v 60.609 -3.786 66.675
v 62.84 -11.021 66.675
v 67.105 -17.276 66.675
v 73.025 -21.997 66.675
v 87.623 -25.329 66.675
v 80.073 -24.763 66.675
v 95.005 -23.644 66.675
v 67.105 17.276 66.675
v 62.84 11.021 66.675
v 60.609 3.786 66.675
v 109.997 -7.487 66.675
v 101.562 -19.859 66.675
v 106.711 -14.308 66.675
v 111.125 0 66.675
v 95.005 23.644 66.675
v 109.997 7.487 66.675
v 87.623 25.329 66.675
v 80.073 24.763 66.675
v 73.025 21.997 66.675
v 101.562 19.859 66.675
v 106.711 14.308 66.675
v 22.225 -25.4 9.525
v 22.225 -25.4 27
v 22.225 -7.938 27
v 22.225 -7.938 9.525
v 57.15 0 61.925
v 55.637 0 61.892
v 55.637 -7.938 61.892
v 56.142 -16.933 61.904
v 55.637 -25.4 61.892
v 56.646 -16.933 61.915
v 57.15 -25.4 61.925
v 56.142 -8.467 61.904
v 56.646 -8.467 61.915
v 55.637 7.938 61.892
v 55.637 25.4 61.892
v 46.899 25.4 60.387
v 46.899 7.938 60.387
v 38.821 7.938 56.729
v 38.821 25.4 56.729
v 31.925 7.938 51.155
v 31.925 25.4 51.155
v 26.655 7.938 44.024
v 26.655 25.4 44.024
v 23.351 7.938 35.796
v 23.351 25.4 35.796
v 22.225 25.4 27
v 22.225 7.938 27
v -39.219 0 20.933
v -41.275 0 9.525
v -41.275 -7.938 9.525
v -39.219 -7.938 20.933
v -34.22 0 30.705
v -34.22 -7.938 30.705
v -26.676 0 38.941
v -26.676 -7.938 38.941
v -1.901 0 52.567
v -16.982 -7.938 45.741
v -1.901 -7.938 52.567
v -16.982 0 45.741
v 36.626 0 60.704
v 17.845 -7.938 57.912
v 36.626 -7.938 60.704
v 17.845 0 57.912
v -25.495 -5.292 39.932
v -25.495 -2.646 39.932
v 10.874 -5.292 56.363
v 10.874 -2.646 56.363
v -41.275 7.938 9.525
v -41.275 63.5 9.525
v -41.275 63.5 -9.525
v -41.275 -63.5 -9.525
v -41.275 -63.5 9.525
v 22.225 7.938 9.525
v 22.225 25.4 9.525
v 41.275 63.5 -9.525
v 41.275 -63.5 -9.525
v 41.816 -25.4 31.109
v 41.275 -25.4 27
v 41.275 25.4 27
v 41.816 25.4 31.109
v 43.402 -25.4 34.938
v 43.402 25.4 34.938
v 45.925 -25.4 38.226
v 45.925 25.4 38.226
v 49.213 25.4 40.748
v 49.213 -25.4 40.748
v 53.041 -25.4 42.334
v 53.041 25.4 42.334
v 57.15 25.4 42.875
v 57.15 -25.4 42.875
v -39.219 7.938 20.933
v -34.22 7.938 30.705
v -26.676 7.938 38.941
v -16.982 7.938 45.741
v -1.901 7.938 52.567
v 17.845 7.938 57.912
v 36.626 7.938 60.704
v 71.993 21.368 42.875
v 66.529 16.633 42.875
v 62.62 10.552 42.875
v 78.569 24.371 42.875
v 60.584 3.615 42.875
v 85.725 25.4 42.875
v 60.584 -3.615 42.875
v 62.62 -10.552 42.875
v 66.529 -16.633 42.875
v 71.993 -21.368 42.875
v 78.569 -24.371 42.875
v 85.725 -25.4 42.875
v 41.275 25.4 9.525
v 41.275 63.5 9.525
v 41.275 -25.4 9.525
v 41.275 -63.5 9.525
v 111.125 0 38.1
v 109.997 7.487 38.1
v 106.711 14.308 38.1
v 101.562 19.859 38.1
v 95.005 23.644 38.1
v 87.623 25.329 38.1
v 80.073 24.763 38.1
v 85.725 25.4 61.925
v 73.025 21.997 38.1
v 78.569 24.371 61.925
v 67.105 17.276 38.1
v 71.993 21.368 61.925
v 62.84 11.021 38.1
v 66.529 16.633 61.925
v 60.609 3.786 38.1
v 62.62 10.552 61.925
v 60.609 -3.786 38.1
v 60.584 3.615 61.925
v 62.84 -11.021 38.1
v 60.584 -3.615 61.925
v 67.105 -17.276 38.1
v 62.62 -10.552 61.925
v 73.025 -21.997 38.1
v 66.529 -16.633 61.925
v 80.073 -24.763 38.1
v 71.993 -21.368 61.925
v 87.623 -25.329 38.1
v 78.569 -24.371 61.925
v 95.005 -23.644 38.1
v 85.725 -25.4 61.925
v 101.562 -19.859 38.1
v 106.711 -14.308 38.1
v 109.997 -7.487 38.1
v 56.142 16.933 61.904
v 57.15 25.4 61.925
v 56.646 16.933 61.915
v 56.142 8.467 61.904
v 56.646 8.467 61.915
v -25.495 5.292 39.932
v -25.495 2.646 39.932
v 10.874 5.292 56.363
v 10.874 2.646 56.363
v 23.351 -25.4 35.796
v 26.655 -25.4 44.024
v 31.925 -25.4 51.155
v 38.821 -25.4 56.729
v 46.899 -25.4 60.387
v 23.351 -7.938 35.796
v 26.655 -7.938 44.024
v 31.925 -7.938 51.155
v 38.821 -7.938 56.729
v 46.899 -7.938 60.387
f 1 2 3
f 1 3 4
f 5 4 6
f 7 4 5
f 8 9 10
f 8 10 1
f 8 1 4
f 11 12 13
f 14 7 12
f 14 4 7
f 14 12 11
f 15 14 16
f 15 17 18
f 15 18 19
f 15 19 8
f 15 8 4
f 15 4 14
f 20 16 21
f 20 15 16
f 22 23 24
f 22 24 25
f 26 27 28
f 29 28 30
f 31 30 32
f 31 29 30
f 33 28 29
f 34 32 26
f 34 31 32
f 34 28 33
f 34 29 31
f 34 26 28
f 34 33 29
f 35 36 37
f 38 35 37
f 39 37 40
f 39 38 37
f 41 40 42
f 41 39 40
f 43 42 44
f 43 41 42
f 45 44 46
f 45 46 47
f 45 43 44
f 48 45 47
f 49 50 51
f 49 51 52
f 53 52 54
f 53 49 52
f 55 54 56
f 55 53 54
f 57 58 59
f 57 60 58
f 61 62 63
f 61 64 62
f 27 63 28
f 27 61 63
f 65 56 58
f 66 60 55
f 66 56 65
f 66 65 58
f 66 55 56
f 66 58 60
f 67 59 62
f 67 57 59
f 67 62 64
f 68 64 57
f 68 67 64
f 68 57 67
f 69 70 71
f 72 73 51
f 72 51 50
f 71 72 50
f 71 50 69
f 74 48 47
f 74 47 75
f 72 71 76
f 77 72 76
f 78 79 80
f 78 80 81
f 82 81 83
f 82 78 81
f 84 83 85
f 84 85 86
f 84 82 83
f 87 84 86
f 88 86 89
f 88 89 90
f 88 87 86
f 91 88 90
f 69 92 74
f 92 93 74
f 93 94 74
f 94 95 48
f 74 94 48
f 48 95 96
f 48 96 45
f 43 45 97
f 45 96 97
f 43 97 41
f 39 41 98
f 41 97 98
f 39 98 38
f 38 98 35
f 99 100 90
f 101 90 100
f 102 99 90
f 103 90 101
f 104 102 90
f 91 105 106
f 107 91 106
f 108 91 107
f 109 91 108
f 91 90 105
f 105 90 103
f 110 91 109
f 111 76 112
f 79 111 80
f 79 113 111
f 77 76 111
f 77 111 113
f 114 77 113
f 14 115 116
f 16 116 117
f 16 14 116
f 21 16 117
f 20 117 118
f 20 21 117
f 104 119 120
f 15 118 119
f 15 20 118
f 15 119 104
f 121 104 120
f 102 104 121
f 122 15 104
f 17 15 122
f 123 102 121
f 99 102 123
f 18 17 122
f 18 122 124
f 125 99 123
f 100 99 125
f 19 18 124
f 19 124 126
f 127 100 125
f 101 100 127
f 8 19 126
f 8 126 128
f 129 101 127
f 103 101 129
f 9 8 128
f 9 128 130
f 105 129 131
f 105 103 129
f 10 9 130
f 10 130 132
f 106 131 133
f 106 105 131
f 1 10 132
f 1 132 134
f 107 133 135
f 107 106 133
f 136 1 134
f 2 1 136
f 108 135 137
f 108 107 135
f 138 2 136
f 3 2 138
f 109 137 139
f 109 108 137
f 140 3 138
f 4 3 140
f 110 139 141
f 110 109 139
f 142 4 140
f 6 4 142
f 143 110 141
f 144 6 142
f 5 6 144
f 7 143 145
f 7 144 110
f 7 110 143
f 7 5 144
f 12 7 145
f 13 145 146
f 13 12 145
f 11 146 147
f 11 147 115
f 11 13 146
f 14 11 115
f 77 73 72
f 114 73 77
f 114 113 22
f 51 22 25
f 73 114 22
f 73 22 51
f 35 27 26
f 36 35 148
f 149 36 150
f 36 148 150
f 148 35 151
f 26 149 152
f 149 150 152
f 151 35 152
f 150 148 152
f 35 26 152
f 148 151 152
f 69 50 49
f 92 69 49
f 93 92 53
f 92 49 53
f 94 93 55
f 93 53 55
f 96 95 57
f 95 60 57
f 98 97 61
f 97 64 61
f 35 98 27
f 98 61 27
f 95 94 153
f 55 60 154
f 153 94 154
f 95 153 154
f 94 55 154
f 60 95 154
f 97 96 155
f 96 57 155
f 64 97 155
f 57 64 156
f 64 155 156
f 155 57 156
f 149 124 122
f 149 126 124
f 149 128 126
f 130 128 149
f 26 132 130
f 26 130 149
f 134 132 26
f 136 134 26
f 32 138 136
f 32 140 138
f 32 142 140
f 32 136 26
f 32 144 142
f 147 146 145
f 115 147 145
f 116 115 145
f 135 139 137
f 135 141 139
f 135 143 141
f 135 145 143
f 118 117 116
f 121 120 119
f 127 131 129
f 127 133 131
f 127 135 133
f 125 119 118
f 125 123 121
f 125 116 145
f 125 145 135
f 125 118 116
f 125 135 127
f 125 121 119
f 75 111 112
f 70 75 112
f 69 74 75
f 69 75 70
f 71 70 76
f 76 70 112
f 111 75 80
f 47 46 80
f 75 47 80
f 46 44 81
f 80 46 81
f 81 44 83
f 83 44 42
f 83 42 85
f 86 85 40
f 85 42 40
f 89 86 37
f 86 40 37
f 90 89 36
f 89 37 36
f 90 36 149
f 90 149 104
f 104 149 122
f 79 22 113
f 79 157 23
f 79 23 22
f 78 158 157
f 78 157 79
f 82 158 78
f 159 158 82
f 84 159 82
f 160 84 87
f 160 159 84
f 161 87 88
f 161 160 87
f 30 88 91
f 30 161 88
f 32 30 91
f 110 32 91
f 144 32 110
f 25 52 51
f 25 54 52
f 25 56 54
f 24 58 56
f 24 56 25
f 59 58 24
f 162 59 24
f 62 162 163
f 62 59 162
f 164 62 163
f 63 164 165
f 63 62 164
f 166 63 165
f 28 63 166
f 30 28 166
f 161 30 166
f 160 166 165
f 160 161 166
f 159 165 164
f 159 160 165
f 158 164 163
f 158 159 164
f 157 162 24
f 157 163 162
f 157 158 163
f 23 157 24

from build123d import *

# Parameters (mm, degrees)
F1_DEPTH = 63.5
F0_W     = 25.4
F0_H     = 19.05
F2_DEPTH = 25.4
F3_DEPTH = 7.9375


with BuildPart() as f1:
    # F0 (on Front) → F1 (new body, symmetric)
    with BuildSketch(Plane.XZ):
        Polygon((41.275, -9.525), (41.275, 9.525), (22.225, 9.525), (-41.275, 9.525), (-41.275, -9.525), align=None)
    extrude(amount=F1_DEPTH, both=True)

    # F0 (on Front) → F2 (join, symmetric)
    with BuildSketch(Plane.XZ):
        with BuildLine():
            Line((22.225, 9.525), (41.275, 9.525))
            Line((41.275, 9.525), (41.275, 27.0002))
            ThreePointArc((41.275, 27.0002), (45.9246798487, 38.2255201513), (57.15, 42.8752))
            Line((57.15, 42.8752), (60.325, 42.8752))
            Line((60.325, 42.8752), (60.325, 61.9252))
            Line((60.325, 61.9252), (57.15, 61.9252))
            add(Edge.make_bspline(
                [(55.6374674655, 61.8924322349), (56.1423918101, 61.9048336292), (56.6465953403, 61.9157496607), (57.15, 61.9252)],
                knots=[110.2644548884, 110.2644548884, 110.2644548884, 110.2644548884, 111.5045361635, 111.5045361635, 111.5045361635, 111.5045361635], degree=3))
            ThreePointArc((55.6374674655, 61.8924322349), (31.9252024412, 51.1552245936), (22.225, 27.0002))
            Line((22.225, 27.0002), (22.225, 9.525))
        make_face()
        with Locations((73.025, 52.4002)):
            Rectangle(F0_W, F0_H)
    extrude(amount=F2_DEPTH, both=True)

    # F0 (on Front) → F3 (join, symmetric)
    with BuildSketch(Plane.XZ):
        with BuildLine():
            Line((-41.275, 9.525), (22.225, 9.525))
            Line((22.225, 9.525), (22.225, 27.0002))
            ThreePointArc((22.225, 27.0002), (31.9252024412, 51.1552245936), (55.6374674655, 61.8924322349))
            add(Edge.make_bspline(
                [(-41.275, 9.525), (-39.8543103668, 47.9433842004), (10.7410491974, 60.789735975), (55.6374674655, 61.8924322349)],
                knots=[0, 0, 0, 0, 110.2644548884, 110.2644548884, 110.2644548884, 110.2644548884], degree=3))
        make_face()
    extrude(amount=F3_DEPTH, both=True)

    # F0 (on Front) → F4 (revolve)
    with BuildSketch(Plane.XZ):
        Polygon((85.725, 61.9252), (85.725, 42.8752), (85.725, 38.1), (111.125, 38.1), (111.125, 66.675), (85.725, 66.675), align=None)
    revolve(axis=Axis((85.725, 0, 52.3875), (0, 0, 1)))


solid = f1.part
